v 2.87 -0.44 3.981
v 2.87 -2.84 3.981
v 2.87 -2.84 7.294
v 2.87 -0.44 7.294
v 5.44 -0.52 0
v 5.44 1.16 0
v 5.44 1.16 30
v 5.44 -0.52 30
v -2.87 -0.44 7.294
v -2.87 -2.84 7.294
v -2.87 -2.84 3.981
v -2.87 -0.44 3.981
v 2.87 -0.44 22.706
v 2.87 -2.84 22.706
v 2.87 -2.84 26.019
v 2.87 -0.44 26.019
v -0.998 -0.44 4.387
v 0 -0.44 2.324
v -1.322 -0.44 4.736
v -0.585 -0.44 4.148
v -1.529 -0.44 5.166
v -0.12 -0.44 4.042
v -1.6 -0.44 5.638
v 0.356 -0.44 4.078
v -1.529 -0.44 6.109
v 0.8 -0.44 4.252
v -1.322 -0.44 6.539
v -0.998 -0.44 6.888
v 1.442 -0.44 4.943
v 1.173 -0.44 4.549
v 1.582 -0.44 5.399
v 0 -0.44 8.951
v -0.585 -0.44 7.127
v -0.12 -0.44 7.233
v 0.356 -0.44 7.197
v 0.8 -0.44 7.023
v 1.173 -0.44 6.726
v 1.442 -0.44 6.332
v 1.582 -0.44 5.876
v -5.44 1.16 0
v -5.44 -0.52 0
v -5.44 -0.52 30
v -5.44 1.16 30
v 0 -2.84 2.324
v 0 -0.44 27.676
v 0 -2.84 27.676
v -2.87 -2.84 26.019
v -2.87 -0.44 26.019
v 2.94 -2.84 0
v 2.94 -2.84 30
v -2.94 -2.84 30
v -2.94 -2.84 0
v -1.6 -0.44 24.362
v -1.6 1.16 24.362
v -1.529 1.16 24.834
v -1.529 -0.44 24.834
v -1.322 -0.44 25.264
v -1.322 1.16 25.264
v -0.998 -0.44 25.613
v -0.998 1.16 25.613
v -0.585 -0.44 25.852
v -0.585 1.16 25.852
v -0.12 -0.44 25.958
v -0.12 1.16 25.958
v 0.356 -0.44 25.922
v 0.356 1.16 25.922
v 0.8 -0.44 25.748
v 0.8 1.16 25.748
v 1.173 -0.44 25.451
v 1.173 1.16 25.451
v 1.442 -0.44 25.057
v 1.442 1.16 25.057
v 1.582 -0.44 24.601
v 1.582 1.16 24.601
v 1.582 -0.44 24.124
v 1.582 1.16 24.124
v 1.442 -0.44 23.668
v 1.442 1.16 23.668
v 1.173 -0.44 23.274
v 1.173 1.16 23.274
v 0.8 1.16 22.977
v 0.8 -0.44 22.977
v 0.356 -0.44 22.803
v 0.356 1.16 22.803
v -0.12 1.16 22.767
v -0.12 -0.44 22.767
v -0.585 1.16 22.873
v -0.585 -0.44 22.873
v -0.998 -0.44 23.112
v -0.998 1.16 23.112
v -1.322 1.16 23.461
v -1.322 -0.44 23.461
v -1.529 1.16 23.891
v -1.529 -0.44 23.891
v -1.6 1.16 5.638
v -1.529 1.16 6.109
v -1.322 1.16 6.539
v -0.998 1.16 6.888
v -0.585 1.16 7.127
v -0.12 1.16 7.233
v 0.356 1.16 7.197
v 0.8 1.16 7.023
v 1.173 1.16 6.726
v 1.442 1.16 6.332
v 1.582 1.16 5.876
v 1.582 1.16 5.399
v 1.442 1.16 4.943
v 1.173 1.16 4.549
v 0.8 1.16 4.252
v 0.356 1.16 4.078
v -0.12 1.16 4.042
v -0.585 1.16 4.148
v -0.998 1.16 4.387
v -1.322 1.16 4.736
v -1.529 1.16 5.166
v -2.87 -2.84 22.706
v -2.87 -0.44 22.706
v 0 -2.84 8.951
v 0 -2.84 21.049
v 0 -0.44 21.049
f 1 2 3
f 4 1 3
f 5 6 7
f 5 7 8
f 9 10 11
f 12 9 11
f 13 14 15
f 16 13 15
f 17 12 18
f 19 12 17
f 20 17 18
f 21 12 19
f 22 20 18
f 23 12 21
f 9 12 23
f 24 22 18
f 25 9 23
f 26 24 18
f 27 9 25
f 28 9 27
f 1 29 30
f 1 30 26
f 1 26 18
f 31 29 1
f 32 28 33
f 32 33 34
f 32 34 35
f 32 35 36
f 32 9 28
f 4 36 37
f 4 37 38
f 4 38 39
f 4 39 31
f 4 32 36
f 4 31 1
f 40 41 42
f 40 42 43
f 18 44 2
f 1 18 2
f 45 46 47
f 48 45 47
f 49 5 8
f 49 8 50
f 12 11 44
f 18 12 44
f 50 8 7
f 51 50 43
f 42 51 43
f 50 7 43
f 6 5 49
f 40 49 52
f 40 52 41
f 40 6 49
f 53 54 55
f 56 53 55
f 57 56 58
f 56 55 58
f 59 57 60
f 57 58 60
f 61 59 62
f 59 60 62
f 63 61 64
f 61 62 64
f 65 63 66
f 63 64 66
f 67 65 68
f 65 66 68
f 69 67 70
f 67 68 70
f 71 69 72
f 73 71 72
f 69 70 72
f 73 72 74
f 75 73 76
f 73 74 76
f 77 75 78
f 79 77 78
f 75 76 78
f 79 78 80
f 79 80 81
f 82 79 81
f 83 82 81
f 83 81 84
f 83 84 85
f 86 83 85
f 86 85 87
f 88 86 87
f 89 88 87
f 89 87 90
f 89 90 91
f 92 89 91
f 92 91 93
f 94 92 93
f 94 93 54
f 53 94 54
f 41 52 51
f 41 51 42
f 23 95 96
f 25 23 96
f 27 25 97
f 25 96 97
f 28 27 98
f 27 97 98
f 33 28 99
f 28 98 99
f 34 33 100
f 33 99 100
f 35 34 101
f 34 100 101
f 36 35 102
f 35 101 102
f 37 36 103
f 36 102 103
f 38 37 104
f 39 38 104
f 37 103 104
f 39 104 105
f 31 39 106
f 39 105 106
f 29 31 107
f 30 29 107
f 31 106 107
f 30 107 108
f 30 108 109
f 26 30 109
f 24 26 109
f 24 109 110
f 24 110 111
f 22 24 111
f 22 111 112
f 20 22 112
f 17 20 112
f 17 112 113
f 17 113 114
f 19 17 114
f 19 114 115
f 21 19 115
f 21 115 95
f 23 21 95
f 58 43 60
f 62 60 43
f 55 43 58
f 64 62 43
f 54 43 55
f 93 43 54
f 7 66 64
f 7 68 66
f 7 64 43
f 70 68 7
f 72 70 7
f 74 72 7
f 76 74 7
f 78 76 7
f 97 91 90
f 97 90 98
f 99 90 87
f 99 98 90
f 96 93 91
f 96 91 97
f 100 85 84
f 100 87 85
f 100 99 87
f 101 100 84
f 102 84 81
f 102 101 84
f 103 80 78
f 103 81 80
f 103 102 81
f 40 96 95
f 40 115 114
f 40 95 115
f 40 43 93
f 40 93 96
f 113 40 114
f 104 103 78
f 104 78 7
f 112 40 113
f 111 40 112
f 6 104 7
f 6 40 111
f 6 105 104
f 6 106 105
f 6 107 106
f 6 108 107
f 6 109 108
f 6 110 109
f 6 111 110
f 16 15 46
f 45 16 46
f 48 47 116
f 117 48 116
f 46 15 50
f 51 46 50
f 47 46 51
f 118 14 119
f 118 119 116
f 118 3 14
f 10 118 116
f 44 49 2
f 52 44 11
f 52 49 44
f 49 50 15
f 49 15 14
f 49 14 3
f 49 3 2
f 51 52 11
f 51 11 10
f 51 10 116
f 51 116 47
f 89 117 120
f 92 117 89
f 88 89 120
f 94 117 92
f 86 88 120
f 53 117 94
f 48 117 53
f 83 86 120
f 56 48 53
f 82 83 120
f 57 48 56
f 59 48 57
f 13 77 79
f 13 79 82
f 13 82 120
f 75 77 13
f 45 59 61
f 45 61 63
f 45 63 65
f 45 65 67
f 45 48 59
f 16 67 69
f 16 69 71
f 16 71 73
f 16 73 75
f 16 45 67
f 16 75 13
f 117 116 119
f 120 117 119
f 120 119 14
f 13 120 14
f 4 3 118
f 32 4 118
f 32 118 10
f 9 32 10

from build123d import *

# Parameters (mm, degrees)
PAD_DEPTH       = 30
SKETCH001_W     = 5.88
SKETCH001_H     = 1.68
POCKET_DEPTH    = 30
POCKET001_DEPTH = 2.4
SKETCH003_R     = 1.6
POCKET002_DEPTH = 4.001


with BuildPart() as part:
    # Sketch → Pad (new body)
    with BuildSketch(Plane.XY):
        Polygon((2.94, -2.84), (-2.94, -2.84), (-5.44, -0.52), (-5.44, 1.16), (-2.94, 1.16), (-2.94, 2.84), (2.94, 2.84), (2.94, 1.16), (5.44, 1.16), (5.44, -0.52), align=None)
    extrude(amount=PAD_DEPTH)

    # Sketch001 (on Face11 of Pad) → Pocket (cut)
    with BuildSketch(Plane(origin=(0, 0, 0), x_dir=(1, 0, 0), z_dir=(0, 0, -1))):
        with Locations((0, -2)):
            Rectangle(SKETCH001_W, SKETCH001_H)
    extrude(amount=-POCKET_DEPTH, mode=Mode.SUBTRACT)

    # Sketch002 (on Face1 of Pocket) → Pocket001 (cut)
    with BuildSketch(Plane.XZ.offset(2.84)):
        Polygon((0, 27.676491), (-2.87, 26.019495), (-2.87, 22.705505), (0, 21.048509), (2.87, 22.705505), (2.87, 26.019495), align=None)
        Polygon((2.87, 7.294495), (0, 8.951491), (-2.87, 7.294495), (-2.87, 3.980505), (0, 2.323509), (2.87, 3.980505), align=None)
    extrude(amount=-POCKET001_DEPTH, mode=Mode.SUBTRACT)

    # Sketch003 (on Face21 of Pocket001) → Pocket002 (cut, through all)
    with BuildSketch(Plane(origin=(0, 1.16, 0), x_dir=(-1, 0, 0), z_dir=(0, 1, 0))):
        with Locations((0, 24.3625)):
            Circle(SKETCH003_R)
        with Locations((0, 5.6375)):
            Circle(SKETCH003_R)
    extrude(amount=-POCKET002_DEPTH, mode=Mode.SUBTRACT)


solid = part.part
